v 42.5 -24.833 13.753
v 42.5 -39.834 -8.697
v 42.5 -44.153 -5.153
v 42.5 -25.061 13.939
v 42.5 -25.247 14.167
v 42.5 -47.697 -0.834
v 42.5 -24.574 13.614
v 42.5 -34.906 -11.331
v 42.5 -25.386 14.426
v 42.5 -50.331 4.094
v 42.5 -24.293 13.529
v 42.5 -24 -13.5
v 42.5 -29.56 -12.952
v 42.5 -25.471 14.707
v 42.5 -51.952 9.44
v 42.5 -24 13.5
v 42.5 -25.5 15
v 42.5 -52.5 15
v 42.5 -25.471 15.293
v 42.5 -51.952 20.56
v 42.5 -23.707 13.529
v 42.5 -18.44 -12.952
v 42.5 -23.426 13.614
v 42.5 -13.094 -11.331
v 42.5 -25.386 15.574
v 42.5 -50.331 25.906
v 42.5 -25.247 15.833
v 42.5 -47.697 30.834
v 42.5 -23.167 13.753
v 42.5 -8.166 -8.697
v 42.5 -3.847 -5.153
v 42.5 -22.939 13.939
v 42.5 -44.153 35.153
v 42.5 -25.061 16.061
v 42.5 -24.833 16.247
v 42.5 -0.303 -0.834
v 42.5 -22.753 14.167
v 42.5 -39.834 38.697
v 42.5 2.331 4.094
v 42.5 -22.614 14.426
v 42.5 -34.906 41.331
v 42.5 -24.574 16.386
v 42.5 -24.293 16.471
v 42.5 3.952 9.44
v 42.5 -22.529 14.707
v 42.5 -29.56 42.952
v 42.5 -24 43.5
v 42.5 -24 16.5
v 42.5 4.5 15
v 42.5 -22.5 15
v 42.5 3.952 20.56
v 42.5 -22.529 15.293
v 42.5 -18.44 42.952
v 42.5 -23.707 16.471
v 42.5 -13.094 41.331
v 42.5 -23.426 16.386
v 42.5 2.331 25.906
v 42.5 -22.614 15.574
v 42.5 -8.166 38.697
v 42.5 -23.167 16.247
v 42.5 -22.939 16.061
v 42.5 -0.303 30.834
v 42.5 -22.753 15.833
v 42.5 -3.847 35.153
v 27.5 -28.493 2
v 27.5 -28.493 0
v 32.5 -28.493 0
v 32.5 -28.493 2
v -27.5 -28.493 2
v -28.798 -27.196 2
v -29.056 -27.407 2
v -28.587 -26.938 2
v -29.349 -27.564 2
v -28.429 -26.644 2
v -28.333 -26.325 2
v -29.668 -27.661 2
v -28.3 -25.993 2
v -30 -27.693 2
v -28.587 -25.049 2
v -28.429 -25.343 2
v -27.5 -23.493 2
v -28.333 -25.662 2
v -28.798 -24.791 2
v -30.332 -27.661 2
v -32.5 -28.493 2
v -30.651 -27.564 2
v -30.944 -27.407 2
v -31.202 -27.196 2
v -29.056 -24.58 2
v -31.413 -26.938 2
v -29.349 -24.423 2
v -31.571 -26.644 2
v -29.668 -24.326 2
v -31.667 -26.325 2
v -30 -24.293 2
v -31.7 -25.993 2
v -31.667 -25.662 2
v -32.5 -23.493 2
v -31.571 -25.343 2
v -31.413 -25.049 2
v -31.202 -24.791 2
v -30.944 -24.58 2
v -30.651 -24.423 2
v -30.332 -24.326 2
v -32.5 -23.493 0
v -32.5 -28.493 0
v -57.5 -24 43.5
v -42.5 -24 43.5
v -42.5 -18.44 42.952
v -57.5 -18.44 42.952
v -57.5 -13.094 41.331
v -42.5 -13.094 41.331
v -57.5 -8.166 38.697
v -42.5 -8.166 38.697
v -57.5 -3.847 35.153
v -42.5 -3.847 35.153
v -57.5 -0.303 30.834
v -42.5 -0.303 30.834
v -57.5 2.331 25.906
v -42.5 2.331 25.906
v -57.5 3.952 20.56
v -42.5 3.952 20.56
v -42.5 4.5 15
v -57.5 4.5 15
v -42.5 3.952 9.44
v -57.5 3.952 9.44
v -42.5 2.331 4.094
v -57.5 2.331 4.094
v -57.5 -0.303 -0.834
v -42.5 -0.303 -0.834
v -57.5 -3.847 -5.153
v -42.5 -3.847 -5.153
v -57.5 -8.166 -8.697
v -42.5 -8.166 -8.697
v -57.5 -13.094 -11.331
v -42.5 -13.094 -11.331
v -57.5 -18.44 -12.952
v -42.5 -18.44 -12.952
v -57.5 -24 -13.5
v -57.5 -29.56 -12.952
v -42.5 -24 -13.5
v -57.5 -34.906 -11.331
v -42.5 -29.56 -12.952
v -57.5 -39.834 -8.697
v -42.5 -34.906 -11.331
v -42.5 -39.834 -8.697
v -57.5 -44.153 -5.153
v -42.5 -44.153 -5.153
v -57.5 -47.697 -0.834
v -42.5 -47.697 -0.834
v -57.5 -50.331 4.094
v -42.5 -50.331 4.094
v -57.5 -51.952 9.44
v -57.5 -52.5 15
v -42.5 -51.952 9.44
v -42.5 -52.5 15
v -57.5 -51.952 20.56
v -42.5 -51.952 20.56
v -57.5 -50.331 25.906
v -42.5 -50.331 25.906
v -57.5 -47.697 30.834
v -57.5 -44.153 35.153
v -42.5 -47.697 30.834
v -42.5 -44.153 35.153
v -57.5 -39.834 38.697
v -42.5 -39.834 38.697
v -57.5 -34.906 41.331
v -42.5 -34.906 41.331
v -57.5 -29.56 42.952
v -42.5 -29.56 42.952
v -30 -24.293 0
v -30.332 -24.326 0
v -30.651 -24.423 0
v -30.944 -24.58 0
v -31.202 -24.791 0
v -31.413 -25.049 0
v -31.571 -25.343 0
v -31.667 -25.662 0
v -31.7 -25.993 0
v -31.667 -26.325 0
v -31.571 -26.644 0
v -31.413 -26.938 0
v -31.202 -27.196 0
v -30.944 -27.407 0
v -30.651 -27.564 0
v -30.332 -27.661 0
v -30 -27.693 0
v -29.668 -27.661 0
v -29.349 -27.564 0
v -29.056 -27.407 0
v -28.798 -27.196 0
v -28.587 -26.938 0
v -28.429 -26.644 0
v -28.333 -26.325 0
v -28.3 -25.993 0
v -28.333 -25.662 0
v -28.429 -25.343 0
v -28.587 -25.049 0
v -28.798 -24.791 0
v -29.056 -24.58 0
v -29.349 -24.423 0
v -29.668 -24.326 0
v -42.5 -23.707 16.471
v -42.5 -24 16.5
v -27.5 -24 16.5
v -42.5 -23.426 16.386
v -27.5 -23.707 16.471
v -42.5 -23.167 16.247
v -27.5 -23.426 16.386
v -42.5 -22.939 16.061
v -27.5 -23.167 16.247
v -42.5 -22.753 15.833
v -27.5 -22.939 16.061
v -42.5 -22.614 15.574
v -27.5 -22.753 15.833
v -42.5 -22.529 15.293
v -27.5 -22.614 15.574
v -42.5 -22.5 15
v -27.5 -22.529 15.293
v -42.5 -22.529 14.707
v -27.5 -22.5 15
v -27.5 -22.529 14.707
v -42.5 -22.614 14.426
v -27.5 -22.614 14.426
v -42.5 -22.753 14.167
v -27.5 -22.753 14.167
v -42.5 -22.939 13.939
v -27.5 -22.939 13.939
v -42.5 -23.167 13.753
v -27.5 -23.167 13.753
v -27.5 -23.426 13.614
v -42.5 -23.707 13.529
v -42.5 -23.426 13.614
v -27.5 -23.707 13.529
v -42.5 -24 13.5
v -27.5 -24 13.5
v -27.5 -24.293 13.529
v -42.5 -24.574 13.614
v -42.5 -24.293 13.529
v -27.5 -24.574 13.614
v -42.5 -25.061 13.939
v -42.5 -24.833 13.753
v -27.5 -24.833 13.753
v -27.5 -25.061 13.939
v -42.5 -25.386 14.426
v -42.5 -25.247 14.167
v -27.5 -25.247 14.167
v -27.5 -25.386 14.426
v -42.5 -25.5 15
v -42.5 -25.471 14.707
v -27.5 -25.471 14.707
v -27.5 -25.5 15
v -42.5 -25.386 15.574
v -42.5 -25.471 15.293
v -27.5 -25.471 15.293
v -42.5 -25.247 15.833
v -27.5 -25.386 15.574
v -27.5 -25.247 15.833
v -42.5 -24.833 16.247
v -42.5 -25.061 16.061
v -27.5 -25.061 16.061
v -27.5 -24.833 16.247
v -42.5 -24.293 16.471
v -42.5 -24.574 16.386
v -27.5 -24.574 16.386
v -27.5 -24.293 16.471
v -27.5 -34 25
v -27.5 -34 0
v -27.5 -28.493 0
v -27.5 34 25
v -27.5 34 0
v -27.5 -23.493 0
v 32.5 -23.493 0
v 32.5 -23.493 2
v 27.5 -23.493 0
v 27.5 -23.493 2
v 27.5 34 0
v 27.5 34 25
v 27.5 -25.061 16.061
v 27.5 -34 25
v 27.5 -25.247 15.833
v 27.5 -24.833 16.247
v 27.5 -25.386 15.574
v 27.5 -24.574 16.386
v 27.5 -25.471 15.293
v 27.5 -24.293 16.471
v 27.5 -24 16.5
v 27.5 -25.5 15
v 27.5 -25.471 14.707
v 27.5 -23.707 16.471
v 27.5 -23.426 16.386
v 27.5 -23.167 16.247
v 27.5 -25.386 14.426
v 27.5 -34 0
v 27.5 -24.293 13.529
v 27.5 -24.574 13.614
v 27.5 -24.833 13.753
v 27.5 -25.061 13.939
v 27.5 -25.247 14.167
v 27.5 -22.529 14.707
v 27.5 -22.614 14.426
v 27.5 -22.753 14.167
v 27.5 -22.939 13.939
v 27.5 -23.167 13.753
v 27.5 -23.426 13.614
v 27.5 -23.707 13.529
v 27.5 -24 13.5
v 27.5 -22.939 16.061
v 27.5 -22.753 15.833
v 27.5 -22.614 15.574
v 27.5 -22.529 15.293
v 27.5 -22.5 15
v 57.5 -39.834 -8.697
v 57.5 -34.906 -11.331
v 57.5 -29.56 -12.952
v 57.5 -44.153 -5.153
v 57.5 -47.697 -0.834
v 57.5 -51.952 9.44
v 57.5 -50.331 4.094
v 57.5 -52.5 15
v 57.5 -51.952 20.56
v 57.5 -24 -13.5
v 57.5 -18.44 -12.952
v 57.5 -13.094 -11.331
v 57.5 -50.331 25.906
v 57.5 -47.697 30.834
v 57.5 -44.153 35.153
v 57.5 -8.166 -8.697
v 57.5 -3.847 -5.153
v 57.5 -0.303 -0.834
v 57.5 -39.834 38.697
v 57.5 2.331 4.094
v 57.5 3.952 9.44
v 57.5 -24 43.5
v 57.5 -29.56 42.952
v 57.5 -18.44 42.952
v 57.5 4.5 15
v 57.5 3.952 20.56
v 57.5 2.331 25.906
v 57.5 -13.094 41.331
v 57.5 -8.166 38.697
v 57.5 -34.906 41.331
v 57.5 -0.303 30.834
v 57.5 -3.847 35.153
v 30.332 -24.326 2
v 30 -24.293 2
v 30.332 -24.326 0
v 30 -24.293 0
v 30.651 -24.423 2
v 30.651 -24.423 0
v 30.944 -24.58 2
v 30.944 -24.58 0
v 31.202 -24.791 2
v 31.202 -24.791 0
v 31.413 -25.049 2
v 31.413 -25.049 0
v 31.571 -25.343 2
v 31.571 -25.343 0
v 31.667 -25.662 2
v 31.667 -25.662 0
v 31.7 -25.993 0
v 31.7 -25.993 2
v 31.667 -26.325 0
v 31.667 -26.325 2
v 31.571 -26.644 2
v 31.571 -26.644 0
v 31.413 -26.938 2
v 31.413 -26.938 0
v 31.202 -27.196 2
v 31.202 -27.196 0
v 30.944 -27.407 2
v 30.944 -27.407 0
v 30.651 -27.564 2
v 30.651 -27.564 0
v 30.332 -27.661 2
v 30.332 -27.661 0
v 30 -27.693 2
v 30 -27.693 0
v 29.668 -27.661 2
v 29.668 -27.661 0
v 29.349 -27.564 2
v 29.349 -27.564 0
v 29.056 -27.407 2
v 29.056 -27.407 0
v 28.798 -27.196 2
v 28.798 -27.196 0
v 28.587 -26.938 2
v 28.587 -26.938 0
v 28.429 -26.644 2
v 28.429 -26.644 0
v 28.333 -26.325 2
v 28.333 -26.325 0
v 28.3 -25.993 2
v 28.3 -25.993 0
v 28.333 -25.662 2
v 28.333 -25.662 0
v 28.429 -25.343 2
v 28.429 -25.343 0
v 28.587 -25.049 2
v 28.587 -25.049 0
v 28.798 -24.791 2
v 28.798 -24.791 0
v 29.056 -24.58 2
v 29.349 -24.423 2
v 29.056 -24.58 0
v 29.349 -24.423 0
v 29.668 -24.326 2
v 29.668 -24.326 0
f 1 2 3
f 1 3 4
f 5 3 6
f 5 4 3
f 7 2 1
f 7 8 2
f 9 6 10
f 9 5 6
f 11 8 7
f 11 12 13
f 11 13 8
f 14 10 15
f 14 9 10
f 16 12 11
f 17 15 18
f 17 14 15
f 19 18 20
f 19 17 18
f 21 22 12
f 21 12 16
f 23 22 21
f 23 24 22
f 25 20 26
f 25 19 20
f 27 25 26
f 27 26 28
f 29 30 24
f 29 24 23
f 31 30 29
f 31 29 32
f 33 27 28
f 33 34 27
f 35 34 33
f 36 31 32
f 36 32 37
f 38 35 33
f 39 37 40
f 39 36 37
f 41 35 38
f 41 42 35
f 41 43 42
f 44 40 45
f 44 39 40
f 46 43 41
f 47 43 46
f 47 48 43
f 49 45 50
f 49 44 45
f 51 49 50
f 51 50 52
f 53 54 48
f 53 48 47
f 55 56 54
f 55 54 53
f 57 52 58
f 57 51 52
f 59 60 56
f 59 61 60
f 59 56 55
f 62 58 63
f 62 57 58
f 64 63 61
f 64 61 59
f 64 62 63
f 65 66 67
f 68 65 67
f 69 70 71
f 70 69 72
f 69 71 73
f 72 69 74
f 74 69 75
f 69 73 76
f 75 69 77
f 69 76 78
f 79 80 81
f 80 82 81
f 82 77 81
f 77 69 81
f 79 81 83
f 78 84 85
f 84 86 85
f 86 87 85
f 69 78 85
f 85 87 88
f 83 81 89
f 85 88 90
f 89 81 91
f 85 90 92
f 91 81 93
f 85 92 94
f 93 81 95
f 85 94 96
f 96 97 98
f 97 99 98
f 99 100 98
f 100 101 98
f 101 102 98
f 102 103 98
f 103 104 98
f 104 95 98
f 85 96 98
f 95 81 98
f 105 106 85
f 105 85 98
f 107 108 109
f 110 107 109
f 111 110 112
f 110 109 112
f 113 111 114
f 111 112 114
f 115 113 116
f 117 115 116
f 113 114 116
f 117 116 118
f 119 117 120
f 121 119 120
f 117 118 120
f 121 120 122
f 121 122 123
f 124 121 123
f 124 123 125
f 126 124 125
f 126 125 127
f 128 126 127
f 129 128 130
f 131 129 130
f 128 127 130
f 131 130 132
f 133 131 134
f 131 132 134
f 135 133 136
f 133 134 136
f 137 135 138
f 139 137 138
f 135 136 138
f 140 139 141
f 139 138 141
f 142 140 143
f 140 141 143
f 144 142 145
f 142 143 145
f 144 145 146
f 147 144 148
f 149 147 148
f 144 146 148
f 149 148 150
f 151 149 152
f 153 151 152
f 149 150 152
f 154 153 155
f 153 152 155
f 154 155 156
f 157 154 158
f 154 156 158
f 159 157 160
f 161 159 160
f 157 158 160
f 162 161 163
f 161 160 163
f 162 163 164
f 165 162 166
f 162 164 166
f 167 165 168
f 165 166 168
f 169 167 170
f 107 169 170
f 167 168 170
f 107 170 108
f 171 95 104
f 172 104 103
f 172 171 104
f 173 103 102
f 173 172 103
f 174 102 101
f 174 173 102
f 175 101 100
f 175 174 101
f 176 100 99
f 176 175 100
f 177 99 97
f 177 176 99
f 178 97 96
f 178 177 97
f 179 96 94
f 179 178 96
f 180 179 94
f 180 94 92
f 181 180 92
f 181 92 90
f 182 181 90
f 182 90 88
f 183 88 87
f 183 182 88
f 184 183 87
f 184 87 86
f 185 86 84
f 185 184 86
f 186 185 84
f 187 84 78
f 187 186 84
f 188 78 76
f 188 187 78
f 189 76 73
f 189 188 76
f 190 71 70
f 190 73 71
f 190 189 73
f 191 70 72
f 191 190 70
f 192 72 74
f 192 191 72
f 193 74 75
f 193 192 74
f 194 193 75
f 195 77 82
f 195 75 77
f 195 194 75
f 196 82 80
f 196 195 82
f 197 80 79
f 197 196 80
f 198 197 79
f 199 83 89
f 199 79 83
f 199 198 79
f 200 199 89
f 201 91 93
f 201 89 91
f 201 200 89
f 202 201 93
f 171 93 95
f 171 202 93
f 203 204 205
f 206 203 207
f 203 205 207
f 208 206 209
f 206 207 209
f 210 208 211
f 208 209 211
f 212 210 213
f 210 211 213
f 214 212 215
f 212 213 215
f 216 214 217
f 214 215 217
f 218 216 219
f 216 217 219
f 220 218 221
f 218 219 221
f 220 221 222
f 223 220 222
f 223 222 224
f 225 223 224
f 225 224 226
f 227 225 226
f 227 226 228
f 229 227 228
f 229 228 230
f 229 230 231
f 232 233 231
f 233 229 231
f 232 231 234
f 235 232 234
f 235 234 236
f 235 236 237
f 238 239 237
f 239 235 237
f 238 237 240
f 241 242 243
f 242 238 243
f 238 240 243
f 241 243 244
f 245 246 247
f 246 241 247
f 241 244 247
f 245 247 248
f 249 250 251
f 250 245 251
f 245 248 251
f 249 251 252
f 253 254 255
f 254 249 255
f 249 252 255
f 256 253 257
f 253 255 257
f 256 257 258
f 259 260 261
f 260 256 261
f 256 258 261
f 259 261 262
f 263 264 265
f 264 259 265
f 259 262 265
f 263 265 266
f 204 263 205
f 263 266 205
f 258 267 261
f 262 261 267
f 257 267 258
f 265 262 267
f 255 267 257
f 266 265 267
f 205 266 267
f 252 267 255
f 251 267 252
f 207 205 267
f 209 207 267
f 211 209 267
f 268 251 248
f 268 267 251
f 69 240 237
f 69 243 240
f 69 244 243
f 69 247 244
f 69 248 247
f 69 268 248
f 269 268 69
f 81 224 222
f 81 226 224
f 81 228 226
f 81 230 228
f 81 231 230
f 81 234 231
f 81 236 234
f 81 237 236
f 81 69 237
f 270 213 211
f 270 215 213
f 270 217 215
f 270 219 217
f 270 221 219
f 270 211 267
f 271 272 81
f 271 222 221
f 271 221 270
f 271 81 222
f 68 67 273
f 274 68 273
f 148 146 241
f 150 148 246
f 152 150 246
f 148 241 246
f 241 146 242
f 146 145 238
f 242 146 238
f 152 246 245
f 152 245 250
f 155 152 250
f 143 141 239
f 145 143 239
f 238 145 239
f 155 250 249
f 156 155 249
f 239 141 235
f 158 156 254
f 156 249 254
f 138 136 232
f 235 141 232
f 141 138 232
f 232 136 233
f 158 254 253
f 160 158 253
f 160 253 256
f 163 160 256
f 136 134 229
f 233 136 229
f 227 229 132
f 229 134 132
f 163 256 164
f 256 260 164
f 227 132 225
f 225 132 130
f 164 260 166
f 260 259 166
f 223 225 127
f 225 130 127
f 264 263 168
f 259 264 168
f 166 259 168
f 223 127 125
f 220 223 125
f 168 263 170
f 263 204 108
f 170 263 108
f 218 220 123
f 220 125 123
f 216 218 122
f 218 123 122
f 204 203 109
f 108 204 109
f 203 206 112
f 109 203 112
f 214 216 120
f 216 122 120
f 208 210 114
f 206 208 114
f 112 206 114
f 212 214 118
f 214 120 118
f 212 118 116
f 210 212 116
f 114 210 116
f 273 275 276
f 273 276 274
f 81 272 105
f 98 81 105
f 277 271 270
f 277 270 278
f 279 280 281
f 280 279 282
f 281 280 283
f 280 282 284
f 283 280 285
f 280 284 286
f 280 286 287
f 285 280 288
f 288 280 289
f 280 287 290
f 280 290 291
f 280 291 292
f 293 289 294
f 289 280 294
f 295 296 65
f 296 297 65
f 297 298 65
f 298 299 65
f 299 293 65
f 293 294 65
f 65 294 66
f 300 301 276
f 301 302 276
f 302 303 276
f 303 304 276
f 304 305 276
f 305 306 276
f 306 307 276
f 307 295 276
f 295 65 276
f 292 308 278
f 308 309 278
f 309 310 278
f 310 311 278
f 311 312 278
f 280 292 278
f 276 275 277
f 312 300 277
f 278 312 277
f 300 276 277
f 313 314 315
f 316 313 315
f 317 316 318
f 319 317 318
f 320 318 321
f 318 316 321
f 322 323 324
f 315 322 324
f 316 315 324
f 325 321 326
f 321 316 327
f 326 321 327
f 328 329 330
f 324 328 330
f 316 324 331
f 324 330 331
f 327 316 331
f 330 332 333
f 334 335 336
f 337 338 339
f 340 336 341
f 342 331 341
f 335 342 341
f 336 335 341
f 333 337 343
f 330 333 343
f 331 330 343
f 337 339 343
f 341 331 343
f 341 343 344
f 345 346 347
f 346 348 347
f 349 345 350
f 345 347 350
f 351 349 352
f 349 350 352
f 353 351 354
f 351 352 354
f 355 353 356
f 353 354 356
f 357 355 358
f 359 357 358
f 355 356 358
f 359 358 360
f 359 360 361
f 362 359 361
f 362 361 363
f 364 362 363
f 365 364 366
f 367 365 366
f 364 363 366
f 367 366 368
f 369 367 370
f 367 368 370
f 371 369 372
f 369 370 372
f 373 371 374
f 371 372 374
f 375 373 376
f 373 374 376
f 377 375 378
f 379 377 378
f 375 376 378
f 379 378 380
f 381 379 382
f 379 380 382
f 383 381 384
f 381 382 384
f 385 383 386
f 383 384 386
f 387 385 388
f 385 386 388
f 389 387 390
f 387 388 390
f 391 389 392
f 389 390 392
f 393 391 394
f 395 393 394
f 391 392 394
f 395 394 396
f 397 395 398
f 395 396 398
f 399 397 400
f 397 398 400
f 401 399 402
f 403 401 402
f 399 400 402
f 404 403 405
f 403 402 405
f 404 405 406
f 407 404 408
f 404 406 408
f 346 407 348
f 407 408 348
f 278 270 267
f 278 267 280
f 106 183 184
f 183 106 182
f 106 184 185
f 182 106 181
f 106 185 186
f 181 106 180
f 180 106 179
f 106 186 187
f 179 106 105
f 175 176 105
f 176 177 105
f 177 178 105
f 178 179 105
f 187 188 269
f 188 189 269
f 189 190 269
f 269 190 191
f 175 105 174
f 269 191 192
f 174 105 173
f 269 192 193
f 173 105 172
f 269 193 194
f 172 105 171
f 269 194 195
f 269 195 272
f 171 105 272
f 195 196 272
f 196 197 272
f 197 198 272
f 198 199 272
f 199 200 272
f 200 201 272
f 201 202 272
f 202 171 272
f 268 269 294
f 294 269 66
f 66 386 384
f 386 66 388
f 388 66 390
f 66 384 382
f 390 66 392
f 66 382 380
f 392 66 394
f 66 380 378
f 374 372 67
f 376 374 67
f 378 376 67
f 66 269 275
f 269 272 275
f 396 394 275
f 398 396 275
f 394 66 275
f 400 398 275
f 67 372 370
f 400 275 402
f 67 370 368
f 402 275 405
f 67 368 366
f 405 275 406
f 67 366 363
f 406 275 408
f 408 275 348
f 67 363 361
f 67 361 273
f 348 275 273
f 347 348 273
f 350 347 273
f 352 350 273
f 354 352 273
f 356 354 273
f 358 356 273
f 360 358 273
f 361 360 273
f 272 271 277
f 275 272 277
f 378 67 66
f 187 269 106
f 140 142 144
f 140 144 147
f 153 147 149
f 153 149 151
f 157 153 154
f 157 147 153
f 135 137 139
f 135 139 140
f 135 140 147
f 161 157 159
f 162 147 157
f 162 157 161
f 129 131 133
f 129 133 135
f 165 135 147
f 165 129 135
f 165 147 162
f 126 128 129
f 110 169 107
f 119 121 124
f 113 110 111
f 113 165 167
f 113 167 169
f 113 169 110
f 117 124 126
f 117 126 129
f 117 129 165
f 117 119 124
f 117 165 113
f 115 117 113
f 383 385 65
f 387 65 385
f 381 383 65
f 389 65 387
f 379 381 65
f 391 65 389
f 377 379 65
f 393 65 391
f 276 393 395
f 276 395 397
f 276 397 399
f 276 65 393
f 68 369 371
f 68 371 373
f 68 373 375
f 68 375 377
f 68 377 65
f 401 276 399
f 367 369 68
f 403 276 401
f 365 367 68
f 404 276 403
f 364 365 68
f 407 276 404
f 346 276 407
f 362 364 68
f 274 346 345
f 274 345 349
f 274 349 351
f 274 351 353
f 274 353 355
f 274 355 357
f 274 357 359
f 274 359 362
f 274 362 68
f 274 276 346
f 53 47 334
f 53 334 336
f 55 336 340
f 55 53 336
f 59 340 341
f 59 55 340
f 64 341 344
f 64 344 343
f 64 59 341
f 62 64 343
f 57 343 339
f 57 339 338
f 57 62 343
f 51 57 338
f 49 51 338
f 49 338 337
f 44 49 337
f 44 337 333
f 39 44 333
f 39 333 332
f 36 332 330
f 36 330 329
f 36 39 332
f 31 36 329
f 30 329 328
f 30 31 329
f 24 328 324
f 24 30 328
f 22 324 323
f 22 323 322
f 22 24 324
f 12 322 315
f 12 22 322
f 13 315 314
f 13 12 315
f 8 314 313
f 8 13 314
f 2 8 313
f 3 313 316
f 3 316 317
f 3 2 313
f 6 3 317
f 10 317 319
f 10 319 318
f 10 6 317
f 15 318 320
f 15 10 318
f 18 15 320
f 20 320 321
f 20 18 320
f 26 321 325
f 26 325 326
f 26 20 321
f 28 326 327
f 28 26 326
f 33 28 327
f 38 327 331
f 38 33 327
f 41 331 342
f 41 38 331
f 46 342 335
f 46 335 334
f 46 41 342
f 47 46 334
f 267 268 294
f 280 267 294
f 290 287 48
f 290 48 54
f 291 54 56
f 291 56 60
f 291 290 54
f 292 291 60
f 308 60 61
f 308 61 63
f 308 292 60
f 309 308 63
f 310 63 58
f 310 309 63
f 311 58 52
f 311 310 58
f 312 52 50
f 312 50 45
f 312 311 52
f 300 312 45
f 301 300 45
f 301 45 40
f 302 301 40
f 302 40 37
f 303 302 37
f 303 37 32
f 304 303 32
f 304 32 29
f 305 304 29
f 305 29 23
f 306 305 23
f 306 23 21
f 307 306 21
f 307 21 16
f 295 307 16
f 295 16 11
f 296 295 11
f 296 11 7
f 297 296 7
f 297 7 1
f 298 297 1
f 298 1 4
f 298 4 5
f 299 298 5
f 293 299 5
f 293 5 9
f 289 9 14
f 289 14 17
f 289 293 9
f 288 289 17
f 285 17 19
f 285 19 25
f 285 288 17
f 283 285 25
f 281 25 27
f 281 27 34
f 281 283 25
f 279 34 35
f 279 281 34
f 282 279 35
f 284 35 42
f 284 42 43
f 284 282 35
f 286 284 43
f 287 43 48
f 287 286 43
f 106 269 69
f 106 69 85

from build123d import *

# Parameters (mm, degrees)
ESQUISSE1_W        = 55
ESQUISSE1_H        = 68
BOSS_EXTRU_1_DEPTH = 25
ESQUISSE3_R        = 1.5
BOSS_EXTRU_2_DEPTH = 20
BOSS_EXTRU_3_START = -5
ESQUISSE4_R        = 28.5
BOSS_EXTRU_3_DEPTH = 15
ESQUISSE5_W        = 5
ESQUISSE5_H        = 5
BOSS_EXTRU_4_DEPTH = 2


with BuildPart() as part:
    # Esquisse1 → Boss.-Extru.1 (new body)
    with BuildSketch(Plane.XY):
        Rectangle(ESQUISSE1_W, ESQUISSE1_H)
    extrude(amount=BOSS_EXTRU_1_DEPTH)

    # Esquisse3 → Boss.-Extru.2 (add)
    with BuildSketch(Plane.ZY.offset(27.5)):
        with Locations((15, -24)):
            Circle(ESQUISSE3_R)
    boss_extru_2 = extrude(amount=BOSS_EXTRU_2_DEPTH)

    # Symétrie1: Boss.-Extru.2 across plane
    add(boss_extru_2.mirror(Plane(origin=(0, 0, 0), x_dir=(0, 0, 1), z_dir=(1, 0, 0))))

    # Esquisse4 → Boss.-Extru.3 (add)
    with BuildSketch(Plane.ZY.offset(47.5).offset(BOSS_EXTRU_3_START)):
        with Locations((15, -24)):
            Circle(ESQUISSE4_R)
    boss_extru_3 = extrude(amount=BOSS_EXTRU_3_DEPTH)

    # Symétrie2: Boss.-Extru.3 across plane
    add(boss_extru_3.mirror(Plane(origin=(0, 0, 0), x_dir=(0, 0, 1), z_dir=(1, 0, 0))))

    # Esquisse5 → Boss.-Extru.4 (add)
    with BuildSketch(Plane(origin=(0, 0, 0), x_dir=(-1, 0, 0), z_dir=(0, 0, -1))):
        with Locations((30, -25.993461036)):
            Rectangle(ESQUISSE5_W, ESQUISSE5_H)
    boss_extru_4 = extrude(amount=-BOSS_EXTRU_4_DEPTH)

    # Esquisse9 → Dégagement M31 (revolve, cut)
    with BuildSketch(Plane(origin=(-30, -25.993461036, 0), x_dir=(0, 1, 0), z_dir=(1, 0, 0))):
        Polygon((0, 0), (0, 4.021463052), (1.7, 3), (1.7, 0), align=None)
    d_gagement_m31 = revolve(axis=Axis((-30, -25.993461036, -6.35), (0, 0, 1)), mode=Mode.SUBTRACT)

    # Symétrie3: Boss.-Extru.4, Dégagement M31 across plane
    add(boss_extru_4.mirror(Plane(origin=(0, 0, 0), x_dir=(0, 0, 1), z_dir=(1, 0, 0))))
    add(d_gagement_m31.mirror(Plane(origin=(0, 0, 0), x_dir=(0, 0, 1), z_dir=(1, 0, 0))), mode=Mode.SUBTRACT)


solid = part.part
